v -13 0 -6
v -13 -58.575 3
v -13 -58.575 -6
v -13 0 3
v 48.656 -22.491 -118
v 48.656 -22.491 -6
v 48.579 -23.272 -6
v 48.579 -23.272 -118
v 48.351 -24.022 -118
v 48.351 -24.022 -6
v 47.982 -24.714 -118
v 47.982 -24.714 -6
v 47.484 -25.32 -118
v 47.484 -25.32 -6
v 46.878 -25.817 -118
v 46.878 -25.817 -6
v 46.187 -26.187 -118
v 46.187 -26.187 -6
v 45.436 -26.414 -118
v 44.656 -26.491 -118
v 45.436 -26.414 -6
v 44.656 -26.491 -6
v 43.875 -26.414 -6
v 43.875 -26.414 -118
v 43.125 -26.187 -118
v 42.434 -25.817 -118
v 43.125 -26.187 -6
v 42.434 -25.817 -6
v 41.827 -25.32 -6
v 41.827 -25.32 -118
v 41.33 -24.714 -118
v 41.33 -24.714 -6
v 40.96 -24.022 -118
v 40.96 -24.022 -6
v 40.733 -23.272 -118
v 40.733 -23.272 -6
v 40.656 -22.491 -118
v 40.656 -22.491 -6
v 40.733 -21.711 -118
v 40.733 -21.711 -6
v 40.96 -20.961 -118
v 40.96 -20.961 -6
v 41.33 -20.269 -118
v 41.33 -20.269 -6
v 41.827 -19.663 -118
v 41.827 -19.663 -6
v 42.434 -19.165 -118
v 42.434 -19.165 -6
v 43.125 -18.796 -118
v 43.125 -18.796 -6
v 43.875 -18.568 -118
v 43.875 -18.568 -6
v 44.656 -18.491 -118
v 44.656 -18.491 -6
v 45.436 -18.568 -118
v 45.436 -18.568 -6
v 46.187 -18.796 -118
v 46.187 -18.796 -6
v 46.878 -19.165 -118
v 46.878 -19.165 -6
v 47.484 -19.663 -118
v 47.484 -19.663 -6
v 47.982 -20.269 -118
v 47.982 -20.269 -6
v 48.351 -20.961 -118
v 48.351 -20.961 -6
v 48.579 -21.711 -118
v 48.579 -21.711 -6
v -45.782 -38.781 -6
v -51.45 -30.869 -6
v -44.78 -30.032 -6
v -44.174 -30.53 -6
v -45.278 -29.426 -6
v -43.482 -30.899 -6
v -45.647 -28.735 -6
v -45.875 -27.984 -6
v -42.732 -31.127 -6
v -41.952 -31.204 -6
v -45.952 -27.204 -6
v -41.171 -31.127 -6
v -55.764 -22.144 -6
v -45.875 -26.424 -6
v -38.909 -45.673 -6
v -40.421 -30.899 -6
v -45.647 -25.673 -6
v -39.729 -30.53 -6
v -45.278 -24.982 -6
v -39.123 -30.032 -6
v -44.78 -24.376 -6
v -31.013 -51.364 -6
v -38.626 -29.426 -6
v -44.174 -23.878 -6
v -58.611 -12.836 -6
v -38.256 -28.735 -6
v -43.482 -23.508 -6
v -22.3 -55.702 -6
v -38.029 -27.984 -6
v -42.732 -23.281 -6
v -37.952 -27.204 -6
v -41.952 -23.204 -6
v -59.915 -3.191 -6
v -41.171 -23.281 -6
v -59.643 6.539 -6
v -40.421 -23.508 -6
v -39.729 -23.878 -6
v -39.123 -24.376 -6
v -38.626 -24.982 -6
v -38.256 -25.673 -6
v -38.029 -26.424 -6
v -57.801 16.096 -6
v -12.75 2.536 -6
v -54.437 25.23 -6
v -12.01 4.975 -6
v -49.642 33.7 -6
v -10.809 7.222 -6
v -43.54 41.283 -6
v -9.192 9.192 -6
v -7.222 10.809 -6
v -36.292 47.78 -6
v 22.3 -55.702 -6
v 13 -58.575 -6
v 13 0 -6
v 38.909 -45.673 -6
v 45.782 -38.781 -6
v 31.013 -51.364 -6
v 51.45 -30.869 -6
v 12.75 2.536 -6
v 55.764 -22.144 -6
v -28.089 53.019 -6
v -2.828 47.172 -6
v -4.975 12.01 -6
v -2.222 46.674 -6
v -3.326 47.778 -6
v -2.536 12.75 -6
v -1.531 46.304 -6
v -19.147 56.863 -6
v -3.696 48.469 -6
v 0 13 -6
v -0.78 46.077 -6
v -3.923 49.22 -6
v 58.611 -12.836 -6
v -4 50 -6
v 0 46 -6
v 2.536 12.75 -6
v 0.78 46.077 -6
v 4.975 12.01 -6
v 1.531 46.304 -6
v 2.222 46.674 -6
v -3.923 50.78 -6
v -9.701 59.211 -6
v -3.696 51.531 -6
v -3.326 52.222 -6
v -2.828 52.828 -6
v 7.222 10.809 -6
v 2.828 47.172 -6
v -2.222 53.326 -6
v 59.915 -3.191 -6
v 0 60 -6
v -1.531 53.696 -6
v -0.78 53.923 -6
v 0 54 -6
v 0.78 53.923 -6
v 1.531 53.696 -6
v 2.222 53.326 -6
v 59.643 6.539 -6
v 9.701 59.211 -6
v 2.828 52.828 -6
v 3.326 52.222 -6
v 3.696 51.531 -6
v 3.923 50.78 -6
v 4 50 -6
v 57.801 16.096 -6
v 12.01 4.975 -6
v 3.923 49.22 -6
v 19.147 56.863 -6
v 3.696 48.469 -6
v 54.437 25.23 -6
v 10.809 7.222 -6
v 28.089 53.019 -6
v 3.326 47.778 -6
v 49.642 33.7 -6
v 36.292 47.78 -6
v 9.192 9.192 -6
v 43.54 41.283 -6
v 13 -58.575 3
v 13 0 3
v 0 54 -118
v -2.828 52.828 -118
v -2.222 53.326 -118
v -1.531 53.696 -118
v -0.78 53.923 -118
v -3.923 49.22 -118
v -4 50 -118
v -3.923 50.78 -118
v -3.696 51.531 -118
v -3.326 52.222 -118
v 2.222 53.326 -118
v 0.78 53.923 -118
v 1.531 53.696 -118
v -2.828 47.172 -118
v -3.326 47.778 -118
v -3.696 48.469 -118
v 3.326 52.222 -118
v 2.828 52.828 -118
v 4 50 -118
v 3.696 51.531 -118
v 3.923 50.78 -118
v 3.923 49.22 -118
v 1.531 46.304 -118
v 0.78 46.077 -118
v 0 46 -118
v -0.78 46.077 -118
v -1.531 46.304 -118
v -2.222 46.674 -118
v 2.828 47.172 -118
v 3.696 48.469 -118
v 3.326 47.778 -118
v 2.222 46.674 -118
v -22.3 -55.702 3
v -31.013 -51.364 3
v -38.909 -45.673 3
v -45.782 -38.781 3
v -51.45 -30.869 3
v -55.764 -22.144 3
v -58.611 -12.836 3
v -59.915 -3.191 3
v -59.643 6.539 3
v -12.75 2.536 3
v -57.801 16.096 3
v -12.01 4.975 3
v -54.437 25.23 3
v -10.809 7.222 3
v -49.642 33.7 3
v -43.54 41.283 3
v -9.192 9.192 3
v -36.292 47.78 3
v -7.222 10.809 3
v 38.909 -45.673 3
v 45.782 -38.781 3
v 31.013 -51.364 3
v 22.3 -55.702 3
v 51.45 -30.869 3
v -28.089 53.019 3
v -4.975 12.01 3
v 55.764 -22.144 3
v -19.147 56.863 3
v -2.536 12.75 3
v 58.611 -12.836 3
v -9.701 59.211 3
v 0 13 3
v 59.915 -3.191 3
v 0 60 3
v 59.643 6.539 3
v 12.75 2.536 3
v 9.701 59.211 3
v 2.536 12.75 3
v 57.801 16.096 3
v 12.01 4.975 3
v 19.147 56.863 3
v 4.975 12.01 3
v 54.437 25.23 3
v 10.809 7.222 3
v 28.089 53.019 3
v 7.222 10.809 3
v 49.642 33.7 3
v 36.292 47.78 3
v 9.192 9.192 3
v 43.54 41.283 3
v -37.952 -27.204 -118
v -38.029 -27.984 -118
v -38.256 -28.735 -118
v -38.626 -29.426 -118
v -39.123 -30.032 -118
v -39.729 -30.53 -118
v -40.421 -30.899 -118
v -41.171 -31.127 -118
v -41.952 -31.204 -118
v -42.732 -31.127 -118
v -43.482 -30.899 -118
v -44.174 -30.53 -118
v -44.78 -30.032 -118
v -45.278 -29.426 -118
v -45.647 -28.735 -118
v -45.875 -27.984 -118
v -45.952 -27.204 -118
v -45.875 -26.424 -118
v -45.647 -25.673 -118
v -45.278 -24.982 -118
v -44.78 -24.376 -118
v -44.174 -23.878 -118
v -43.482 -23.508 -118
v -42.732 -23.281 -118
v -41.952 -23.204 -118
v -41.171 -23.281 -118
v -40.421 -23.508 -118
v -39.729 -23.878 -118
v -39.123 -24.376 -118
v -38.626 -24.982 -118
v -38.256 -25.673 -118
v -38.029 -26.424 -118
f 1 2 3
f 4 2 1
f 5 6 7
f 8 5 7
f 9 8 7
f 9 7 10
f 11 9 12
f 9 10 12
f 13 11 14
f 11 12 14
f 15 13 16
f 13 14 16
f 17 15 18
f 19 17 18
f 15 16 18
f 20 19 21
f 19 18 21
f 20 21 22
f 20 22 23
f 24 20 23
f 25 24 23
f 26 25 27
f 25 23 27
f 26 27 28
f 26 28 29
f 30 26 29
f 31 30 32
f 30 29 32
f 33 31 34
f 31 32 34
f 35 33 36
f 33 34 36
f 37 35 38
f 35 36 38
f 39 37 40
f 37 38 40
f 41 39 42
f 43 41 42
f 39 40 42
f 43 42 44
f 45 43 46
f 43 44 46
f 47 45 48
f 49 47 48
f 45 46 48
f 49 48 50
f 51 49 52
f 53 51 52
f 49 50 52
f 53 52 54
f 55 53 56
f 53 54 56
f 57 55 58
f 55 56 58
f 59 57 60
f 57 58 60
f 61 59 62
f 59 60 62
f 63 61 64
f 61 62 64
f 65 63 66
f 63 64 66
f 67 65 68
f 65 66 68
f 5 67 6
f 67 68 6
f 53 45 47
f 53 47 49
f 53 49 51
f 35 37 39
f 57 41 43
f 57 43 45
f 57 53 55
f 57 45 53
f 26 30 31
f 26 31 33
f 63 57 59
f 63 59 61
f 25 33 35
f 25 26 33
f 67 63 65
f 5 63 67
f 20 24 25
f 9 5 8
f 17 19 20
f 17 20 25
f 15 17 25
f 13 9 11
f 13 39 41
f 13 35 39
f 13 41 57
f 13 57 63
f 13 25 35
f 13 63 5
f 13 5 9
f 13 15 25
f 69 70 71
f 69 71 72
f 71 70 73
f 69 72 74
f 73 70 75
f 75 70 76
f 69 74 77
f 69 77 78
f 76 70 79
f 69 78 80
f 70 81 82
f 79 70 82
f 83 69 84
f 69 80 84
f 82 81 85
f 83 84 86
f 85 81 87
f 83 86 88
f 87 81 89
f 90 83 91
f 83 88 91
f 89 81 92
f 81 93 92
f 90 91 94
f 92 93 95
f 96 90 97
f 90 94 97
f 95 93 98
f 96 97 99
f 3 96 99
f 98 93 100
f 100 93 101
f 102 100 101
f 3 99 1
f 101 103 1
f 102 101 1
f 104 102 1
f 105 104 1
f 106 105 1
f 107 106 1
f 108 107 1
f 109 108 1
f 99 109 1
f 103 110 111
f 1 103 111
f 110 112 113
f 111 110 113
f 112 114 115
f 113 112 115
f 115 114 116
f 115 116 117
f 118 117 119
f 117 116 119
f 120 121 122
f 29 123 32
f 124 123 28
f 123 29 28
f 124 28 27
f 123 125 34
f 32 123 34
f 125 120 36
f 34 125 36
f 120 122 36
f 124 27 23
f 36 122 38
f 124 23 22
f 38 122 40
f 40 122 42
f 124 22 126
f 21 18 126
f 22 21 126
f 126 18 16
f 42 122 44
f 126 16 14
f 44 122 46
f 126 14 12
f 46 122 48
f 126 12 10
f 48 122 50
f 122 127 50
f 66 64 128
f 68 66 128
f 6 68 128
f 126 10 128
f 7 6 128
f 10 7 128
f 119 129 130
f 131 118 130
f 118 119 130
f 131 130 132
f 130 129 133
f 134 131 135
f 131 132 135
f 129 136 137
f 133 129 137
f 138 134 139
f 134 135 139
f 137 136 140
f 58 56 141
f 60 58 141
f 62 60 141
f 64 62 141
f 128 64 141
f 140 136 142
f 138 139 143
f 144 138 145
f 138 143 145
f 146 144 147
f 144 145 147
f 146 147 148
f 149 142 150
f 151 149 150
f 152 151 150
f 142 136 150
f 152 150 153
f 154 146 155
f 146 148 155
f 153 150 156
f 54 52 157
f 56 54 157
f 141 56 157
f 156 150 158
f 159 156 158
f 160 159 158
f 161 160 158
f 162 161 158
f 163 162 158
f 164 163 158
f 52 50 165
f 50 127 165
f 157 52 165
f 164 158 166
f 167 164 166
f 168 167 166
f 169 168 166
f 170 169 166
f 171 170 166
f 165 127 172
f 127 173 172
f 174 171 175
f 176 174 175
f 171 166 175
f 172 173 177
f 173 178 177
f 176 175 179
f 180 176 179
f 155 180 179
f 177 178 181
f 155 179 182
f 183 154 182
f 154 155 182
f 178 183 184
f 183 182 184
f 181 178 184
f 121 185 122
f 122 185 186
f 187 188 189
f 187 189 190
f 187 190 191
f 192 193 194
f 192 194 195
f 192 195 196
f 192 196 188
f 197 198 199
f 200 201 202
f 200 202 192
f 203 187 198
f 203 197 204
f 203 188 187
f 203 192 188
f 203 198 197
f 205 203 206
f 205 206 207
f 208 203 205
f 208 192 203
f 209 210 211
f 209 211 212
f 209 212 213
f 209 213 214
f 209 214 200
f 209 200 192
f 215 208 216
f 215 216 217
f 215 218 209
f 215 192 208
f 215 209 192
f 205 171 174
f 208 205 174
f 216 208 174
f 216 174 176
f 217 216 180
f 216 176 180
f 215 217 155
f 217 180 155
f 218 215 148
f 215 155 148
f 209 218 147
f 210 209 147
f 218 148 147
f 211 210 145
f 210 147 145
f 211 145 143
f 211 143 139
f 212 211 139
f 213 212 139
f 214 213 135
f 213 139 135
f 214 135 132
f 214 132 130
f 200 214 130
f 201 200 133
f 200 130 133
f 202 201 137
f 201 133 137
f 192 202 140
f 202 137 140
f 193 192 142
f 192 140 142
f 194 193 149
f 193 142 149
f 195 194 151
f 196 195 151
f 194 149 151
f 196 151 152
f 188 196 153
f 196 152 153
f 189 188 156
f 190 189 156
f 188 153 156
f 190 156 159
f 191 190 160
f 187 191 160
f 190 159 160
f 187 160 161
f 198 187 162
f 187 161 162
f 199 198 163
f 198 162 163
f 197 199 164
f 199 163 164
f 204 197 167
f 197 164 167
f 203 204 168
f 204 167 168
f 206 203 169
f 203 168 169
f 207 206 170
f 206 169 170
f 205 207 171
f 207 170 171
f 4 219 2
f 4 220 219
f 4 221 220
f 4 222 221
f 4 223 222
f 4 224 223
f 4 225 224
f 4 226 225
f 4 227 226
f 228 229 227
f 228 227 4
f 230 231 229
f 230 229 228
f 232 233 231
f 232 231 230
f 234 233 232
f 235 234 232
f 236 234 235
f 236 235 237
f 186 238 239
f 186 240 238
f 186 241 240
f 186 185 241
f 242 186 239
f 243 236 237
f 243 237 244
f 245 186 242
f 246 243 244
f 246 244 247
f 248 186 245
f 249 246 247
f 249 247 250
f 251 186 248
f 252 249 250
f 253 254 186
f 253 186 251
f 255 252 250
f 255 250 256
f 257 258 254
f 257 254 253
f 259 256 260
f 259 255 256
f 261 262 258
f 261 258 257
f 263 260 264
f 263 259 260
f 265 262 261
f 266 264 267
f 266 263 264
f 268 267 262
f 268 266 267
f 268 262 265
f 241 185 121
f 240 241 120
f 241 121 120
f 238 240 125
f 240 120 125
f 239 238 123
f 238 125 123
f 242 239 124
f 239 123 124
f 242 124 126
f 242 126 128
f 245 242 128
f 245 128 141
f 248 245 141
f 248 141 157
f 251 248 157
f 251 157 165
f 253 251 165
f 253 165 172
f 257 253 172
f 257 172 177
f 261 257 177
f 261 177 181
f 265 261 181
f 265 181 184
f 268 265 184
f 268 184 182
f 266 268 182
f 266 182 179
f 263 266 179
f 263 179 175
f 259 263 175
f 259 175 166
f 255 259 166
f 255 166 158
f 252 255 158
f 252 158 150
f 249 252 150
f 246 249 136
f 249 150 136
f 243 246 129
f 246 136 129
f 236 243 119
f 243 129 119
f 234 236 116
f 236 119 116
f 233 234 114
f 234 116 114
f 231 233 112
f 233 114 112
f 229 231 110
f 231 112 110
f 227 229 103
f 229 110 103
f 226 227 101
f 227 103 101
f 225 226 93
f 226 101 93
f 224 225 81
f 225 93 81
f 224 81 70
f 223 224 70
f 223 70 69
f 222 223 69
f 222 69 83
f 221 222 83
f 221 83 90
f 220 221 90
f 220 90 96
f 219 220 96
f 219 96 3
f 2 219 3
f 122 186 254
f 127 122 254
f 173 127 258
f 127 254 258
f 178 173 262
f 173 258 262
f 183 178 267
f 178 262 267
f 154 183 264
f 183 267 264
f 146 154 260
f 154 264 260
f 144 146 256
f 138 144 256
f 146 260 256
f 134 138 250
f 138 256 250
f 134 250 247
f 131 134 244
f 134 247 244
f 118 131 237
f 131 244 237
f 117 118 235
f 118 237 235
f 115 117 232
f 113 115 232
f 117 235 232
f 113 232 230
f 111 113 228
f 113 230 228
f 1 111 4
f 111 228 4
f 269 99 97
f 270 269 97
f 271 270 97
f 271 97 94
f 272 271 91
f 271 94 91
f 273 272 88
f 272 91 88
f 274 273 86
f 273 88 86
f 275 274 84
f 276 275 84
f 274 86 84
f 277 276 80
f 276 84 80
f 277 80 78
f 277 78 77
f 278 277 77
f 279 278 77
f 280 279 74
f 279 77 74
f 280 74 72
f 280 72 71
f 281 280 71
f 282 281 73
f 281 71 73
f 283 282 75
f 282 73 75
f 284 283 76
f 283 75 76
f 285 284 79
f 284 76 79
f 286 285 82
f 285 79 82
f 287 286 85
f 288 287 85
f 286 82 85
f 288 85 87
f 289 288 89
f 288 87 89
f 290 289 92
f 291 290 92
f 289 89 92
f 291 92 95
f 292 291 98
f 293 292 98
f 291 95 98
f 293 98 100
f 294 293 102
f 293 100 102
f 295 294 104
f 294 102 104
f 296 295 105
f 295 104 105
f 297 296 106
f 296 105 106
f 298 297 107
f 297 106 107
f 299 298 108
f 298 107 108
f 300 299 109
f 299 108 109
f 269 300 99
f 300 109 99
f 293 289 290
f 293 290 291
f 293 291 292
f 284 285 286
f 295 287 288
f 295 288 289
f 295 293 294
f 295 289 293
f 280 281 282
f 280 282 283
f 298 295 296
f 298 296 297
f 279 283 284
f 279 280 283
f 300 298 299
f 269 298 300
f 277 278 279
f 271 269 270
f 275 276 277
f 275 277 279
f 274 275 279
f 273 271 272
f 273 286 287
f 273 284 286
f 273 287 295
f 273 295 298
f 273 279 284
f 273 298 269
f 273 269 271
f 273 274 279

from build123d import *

# Parameters (mm, degrees)
EXTRUDE_1_DEPTH      = 3
EXTRUDE_1_DEPTH_BACK = 6
SKETCH_2_R           = 60
SKETCH_5_R           = 4
EXTRUDE_2_DEPTH      = 112
SKETCH_6_R           = 4
EXTRUDE_3_DEPTH      = 112
SKETCH_7_R           = 13
CUT_EXTRUDE_2_DEPTH  = 20
SKETCH_14_W          = 26
SKETCH_14_H          = 65
CUT_EXTRUDE_3_DEPTH  = 10


with BuildPart() as part:
    # 草图2 → 凸台-拉伸1 (new, two sides: drawn at the far end of the back side and taken through both)
    with BuildSketch(Plane.XY.offset(-EXTRUDE_1_DEPTH_BACK)):
        Circle(SKETCH_2_R)
    extrude(amount=EXTRUDE_1_DEPTH + EXTRUDE_1_DEPTH_BACK)

    # 草图5 → 凸台-拉伸2 (add)
    with BuildSketch(Plane(origin=(0, 0, -6), x_dir=(-1, 0, 0), z_dir=(0, 0, -1))):
        with Locations(Location((0, 50, 0), (0, 0, 180))):
            Circle(SKETCH_5_R)
    extrude(amount=EXTRUDE_2_DEPTH)

    # 草图6 → 凸台-拉伸3 (add)
    with BuildSketch(Plane(origin=(0, 0, -6), x_dir=(-1, 0, 0), z_dir=(0, 0, -1))):
        with Locations(Location((-44.655818583, -22.491284238, 0), (0, 0, 180))):
            Circle(SKETCH_6_R)
        with Locations(Location((41.95168902, -27.203966409, 0), (0, 0, 180))):
            Circle(SKETCH_6_R)
    extrude(amount=EXTRUDE_3_DEPTH)

    # 草图7 → 切除-拉伸2 (cut)
    with BuildSketch(Plane.XY.offset(3)):
        Circle(SKETCH_7_R)
    extrude(amount=-CUT_EXTRUDE_2_DEPTH, mode=Mode.SUBTRACT)

    # 草图14 → 切除-拉伸3 (cut)
    with BuildSketch(Plane.XY.offset(3)):
        with Locations((0, -32.5)):
            Rectangle(SKETCH_14_W, SKETCH_14_H)
    extrude(amount=-CUT_EXTRUDE_3_DEPTH, mode=Mode.SUBTRACT)


solid = part.part
